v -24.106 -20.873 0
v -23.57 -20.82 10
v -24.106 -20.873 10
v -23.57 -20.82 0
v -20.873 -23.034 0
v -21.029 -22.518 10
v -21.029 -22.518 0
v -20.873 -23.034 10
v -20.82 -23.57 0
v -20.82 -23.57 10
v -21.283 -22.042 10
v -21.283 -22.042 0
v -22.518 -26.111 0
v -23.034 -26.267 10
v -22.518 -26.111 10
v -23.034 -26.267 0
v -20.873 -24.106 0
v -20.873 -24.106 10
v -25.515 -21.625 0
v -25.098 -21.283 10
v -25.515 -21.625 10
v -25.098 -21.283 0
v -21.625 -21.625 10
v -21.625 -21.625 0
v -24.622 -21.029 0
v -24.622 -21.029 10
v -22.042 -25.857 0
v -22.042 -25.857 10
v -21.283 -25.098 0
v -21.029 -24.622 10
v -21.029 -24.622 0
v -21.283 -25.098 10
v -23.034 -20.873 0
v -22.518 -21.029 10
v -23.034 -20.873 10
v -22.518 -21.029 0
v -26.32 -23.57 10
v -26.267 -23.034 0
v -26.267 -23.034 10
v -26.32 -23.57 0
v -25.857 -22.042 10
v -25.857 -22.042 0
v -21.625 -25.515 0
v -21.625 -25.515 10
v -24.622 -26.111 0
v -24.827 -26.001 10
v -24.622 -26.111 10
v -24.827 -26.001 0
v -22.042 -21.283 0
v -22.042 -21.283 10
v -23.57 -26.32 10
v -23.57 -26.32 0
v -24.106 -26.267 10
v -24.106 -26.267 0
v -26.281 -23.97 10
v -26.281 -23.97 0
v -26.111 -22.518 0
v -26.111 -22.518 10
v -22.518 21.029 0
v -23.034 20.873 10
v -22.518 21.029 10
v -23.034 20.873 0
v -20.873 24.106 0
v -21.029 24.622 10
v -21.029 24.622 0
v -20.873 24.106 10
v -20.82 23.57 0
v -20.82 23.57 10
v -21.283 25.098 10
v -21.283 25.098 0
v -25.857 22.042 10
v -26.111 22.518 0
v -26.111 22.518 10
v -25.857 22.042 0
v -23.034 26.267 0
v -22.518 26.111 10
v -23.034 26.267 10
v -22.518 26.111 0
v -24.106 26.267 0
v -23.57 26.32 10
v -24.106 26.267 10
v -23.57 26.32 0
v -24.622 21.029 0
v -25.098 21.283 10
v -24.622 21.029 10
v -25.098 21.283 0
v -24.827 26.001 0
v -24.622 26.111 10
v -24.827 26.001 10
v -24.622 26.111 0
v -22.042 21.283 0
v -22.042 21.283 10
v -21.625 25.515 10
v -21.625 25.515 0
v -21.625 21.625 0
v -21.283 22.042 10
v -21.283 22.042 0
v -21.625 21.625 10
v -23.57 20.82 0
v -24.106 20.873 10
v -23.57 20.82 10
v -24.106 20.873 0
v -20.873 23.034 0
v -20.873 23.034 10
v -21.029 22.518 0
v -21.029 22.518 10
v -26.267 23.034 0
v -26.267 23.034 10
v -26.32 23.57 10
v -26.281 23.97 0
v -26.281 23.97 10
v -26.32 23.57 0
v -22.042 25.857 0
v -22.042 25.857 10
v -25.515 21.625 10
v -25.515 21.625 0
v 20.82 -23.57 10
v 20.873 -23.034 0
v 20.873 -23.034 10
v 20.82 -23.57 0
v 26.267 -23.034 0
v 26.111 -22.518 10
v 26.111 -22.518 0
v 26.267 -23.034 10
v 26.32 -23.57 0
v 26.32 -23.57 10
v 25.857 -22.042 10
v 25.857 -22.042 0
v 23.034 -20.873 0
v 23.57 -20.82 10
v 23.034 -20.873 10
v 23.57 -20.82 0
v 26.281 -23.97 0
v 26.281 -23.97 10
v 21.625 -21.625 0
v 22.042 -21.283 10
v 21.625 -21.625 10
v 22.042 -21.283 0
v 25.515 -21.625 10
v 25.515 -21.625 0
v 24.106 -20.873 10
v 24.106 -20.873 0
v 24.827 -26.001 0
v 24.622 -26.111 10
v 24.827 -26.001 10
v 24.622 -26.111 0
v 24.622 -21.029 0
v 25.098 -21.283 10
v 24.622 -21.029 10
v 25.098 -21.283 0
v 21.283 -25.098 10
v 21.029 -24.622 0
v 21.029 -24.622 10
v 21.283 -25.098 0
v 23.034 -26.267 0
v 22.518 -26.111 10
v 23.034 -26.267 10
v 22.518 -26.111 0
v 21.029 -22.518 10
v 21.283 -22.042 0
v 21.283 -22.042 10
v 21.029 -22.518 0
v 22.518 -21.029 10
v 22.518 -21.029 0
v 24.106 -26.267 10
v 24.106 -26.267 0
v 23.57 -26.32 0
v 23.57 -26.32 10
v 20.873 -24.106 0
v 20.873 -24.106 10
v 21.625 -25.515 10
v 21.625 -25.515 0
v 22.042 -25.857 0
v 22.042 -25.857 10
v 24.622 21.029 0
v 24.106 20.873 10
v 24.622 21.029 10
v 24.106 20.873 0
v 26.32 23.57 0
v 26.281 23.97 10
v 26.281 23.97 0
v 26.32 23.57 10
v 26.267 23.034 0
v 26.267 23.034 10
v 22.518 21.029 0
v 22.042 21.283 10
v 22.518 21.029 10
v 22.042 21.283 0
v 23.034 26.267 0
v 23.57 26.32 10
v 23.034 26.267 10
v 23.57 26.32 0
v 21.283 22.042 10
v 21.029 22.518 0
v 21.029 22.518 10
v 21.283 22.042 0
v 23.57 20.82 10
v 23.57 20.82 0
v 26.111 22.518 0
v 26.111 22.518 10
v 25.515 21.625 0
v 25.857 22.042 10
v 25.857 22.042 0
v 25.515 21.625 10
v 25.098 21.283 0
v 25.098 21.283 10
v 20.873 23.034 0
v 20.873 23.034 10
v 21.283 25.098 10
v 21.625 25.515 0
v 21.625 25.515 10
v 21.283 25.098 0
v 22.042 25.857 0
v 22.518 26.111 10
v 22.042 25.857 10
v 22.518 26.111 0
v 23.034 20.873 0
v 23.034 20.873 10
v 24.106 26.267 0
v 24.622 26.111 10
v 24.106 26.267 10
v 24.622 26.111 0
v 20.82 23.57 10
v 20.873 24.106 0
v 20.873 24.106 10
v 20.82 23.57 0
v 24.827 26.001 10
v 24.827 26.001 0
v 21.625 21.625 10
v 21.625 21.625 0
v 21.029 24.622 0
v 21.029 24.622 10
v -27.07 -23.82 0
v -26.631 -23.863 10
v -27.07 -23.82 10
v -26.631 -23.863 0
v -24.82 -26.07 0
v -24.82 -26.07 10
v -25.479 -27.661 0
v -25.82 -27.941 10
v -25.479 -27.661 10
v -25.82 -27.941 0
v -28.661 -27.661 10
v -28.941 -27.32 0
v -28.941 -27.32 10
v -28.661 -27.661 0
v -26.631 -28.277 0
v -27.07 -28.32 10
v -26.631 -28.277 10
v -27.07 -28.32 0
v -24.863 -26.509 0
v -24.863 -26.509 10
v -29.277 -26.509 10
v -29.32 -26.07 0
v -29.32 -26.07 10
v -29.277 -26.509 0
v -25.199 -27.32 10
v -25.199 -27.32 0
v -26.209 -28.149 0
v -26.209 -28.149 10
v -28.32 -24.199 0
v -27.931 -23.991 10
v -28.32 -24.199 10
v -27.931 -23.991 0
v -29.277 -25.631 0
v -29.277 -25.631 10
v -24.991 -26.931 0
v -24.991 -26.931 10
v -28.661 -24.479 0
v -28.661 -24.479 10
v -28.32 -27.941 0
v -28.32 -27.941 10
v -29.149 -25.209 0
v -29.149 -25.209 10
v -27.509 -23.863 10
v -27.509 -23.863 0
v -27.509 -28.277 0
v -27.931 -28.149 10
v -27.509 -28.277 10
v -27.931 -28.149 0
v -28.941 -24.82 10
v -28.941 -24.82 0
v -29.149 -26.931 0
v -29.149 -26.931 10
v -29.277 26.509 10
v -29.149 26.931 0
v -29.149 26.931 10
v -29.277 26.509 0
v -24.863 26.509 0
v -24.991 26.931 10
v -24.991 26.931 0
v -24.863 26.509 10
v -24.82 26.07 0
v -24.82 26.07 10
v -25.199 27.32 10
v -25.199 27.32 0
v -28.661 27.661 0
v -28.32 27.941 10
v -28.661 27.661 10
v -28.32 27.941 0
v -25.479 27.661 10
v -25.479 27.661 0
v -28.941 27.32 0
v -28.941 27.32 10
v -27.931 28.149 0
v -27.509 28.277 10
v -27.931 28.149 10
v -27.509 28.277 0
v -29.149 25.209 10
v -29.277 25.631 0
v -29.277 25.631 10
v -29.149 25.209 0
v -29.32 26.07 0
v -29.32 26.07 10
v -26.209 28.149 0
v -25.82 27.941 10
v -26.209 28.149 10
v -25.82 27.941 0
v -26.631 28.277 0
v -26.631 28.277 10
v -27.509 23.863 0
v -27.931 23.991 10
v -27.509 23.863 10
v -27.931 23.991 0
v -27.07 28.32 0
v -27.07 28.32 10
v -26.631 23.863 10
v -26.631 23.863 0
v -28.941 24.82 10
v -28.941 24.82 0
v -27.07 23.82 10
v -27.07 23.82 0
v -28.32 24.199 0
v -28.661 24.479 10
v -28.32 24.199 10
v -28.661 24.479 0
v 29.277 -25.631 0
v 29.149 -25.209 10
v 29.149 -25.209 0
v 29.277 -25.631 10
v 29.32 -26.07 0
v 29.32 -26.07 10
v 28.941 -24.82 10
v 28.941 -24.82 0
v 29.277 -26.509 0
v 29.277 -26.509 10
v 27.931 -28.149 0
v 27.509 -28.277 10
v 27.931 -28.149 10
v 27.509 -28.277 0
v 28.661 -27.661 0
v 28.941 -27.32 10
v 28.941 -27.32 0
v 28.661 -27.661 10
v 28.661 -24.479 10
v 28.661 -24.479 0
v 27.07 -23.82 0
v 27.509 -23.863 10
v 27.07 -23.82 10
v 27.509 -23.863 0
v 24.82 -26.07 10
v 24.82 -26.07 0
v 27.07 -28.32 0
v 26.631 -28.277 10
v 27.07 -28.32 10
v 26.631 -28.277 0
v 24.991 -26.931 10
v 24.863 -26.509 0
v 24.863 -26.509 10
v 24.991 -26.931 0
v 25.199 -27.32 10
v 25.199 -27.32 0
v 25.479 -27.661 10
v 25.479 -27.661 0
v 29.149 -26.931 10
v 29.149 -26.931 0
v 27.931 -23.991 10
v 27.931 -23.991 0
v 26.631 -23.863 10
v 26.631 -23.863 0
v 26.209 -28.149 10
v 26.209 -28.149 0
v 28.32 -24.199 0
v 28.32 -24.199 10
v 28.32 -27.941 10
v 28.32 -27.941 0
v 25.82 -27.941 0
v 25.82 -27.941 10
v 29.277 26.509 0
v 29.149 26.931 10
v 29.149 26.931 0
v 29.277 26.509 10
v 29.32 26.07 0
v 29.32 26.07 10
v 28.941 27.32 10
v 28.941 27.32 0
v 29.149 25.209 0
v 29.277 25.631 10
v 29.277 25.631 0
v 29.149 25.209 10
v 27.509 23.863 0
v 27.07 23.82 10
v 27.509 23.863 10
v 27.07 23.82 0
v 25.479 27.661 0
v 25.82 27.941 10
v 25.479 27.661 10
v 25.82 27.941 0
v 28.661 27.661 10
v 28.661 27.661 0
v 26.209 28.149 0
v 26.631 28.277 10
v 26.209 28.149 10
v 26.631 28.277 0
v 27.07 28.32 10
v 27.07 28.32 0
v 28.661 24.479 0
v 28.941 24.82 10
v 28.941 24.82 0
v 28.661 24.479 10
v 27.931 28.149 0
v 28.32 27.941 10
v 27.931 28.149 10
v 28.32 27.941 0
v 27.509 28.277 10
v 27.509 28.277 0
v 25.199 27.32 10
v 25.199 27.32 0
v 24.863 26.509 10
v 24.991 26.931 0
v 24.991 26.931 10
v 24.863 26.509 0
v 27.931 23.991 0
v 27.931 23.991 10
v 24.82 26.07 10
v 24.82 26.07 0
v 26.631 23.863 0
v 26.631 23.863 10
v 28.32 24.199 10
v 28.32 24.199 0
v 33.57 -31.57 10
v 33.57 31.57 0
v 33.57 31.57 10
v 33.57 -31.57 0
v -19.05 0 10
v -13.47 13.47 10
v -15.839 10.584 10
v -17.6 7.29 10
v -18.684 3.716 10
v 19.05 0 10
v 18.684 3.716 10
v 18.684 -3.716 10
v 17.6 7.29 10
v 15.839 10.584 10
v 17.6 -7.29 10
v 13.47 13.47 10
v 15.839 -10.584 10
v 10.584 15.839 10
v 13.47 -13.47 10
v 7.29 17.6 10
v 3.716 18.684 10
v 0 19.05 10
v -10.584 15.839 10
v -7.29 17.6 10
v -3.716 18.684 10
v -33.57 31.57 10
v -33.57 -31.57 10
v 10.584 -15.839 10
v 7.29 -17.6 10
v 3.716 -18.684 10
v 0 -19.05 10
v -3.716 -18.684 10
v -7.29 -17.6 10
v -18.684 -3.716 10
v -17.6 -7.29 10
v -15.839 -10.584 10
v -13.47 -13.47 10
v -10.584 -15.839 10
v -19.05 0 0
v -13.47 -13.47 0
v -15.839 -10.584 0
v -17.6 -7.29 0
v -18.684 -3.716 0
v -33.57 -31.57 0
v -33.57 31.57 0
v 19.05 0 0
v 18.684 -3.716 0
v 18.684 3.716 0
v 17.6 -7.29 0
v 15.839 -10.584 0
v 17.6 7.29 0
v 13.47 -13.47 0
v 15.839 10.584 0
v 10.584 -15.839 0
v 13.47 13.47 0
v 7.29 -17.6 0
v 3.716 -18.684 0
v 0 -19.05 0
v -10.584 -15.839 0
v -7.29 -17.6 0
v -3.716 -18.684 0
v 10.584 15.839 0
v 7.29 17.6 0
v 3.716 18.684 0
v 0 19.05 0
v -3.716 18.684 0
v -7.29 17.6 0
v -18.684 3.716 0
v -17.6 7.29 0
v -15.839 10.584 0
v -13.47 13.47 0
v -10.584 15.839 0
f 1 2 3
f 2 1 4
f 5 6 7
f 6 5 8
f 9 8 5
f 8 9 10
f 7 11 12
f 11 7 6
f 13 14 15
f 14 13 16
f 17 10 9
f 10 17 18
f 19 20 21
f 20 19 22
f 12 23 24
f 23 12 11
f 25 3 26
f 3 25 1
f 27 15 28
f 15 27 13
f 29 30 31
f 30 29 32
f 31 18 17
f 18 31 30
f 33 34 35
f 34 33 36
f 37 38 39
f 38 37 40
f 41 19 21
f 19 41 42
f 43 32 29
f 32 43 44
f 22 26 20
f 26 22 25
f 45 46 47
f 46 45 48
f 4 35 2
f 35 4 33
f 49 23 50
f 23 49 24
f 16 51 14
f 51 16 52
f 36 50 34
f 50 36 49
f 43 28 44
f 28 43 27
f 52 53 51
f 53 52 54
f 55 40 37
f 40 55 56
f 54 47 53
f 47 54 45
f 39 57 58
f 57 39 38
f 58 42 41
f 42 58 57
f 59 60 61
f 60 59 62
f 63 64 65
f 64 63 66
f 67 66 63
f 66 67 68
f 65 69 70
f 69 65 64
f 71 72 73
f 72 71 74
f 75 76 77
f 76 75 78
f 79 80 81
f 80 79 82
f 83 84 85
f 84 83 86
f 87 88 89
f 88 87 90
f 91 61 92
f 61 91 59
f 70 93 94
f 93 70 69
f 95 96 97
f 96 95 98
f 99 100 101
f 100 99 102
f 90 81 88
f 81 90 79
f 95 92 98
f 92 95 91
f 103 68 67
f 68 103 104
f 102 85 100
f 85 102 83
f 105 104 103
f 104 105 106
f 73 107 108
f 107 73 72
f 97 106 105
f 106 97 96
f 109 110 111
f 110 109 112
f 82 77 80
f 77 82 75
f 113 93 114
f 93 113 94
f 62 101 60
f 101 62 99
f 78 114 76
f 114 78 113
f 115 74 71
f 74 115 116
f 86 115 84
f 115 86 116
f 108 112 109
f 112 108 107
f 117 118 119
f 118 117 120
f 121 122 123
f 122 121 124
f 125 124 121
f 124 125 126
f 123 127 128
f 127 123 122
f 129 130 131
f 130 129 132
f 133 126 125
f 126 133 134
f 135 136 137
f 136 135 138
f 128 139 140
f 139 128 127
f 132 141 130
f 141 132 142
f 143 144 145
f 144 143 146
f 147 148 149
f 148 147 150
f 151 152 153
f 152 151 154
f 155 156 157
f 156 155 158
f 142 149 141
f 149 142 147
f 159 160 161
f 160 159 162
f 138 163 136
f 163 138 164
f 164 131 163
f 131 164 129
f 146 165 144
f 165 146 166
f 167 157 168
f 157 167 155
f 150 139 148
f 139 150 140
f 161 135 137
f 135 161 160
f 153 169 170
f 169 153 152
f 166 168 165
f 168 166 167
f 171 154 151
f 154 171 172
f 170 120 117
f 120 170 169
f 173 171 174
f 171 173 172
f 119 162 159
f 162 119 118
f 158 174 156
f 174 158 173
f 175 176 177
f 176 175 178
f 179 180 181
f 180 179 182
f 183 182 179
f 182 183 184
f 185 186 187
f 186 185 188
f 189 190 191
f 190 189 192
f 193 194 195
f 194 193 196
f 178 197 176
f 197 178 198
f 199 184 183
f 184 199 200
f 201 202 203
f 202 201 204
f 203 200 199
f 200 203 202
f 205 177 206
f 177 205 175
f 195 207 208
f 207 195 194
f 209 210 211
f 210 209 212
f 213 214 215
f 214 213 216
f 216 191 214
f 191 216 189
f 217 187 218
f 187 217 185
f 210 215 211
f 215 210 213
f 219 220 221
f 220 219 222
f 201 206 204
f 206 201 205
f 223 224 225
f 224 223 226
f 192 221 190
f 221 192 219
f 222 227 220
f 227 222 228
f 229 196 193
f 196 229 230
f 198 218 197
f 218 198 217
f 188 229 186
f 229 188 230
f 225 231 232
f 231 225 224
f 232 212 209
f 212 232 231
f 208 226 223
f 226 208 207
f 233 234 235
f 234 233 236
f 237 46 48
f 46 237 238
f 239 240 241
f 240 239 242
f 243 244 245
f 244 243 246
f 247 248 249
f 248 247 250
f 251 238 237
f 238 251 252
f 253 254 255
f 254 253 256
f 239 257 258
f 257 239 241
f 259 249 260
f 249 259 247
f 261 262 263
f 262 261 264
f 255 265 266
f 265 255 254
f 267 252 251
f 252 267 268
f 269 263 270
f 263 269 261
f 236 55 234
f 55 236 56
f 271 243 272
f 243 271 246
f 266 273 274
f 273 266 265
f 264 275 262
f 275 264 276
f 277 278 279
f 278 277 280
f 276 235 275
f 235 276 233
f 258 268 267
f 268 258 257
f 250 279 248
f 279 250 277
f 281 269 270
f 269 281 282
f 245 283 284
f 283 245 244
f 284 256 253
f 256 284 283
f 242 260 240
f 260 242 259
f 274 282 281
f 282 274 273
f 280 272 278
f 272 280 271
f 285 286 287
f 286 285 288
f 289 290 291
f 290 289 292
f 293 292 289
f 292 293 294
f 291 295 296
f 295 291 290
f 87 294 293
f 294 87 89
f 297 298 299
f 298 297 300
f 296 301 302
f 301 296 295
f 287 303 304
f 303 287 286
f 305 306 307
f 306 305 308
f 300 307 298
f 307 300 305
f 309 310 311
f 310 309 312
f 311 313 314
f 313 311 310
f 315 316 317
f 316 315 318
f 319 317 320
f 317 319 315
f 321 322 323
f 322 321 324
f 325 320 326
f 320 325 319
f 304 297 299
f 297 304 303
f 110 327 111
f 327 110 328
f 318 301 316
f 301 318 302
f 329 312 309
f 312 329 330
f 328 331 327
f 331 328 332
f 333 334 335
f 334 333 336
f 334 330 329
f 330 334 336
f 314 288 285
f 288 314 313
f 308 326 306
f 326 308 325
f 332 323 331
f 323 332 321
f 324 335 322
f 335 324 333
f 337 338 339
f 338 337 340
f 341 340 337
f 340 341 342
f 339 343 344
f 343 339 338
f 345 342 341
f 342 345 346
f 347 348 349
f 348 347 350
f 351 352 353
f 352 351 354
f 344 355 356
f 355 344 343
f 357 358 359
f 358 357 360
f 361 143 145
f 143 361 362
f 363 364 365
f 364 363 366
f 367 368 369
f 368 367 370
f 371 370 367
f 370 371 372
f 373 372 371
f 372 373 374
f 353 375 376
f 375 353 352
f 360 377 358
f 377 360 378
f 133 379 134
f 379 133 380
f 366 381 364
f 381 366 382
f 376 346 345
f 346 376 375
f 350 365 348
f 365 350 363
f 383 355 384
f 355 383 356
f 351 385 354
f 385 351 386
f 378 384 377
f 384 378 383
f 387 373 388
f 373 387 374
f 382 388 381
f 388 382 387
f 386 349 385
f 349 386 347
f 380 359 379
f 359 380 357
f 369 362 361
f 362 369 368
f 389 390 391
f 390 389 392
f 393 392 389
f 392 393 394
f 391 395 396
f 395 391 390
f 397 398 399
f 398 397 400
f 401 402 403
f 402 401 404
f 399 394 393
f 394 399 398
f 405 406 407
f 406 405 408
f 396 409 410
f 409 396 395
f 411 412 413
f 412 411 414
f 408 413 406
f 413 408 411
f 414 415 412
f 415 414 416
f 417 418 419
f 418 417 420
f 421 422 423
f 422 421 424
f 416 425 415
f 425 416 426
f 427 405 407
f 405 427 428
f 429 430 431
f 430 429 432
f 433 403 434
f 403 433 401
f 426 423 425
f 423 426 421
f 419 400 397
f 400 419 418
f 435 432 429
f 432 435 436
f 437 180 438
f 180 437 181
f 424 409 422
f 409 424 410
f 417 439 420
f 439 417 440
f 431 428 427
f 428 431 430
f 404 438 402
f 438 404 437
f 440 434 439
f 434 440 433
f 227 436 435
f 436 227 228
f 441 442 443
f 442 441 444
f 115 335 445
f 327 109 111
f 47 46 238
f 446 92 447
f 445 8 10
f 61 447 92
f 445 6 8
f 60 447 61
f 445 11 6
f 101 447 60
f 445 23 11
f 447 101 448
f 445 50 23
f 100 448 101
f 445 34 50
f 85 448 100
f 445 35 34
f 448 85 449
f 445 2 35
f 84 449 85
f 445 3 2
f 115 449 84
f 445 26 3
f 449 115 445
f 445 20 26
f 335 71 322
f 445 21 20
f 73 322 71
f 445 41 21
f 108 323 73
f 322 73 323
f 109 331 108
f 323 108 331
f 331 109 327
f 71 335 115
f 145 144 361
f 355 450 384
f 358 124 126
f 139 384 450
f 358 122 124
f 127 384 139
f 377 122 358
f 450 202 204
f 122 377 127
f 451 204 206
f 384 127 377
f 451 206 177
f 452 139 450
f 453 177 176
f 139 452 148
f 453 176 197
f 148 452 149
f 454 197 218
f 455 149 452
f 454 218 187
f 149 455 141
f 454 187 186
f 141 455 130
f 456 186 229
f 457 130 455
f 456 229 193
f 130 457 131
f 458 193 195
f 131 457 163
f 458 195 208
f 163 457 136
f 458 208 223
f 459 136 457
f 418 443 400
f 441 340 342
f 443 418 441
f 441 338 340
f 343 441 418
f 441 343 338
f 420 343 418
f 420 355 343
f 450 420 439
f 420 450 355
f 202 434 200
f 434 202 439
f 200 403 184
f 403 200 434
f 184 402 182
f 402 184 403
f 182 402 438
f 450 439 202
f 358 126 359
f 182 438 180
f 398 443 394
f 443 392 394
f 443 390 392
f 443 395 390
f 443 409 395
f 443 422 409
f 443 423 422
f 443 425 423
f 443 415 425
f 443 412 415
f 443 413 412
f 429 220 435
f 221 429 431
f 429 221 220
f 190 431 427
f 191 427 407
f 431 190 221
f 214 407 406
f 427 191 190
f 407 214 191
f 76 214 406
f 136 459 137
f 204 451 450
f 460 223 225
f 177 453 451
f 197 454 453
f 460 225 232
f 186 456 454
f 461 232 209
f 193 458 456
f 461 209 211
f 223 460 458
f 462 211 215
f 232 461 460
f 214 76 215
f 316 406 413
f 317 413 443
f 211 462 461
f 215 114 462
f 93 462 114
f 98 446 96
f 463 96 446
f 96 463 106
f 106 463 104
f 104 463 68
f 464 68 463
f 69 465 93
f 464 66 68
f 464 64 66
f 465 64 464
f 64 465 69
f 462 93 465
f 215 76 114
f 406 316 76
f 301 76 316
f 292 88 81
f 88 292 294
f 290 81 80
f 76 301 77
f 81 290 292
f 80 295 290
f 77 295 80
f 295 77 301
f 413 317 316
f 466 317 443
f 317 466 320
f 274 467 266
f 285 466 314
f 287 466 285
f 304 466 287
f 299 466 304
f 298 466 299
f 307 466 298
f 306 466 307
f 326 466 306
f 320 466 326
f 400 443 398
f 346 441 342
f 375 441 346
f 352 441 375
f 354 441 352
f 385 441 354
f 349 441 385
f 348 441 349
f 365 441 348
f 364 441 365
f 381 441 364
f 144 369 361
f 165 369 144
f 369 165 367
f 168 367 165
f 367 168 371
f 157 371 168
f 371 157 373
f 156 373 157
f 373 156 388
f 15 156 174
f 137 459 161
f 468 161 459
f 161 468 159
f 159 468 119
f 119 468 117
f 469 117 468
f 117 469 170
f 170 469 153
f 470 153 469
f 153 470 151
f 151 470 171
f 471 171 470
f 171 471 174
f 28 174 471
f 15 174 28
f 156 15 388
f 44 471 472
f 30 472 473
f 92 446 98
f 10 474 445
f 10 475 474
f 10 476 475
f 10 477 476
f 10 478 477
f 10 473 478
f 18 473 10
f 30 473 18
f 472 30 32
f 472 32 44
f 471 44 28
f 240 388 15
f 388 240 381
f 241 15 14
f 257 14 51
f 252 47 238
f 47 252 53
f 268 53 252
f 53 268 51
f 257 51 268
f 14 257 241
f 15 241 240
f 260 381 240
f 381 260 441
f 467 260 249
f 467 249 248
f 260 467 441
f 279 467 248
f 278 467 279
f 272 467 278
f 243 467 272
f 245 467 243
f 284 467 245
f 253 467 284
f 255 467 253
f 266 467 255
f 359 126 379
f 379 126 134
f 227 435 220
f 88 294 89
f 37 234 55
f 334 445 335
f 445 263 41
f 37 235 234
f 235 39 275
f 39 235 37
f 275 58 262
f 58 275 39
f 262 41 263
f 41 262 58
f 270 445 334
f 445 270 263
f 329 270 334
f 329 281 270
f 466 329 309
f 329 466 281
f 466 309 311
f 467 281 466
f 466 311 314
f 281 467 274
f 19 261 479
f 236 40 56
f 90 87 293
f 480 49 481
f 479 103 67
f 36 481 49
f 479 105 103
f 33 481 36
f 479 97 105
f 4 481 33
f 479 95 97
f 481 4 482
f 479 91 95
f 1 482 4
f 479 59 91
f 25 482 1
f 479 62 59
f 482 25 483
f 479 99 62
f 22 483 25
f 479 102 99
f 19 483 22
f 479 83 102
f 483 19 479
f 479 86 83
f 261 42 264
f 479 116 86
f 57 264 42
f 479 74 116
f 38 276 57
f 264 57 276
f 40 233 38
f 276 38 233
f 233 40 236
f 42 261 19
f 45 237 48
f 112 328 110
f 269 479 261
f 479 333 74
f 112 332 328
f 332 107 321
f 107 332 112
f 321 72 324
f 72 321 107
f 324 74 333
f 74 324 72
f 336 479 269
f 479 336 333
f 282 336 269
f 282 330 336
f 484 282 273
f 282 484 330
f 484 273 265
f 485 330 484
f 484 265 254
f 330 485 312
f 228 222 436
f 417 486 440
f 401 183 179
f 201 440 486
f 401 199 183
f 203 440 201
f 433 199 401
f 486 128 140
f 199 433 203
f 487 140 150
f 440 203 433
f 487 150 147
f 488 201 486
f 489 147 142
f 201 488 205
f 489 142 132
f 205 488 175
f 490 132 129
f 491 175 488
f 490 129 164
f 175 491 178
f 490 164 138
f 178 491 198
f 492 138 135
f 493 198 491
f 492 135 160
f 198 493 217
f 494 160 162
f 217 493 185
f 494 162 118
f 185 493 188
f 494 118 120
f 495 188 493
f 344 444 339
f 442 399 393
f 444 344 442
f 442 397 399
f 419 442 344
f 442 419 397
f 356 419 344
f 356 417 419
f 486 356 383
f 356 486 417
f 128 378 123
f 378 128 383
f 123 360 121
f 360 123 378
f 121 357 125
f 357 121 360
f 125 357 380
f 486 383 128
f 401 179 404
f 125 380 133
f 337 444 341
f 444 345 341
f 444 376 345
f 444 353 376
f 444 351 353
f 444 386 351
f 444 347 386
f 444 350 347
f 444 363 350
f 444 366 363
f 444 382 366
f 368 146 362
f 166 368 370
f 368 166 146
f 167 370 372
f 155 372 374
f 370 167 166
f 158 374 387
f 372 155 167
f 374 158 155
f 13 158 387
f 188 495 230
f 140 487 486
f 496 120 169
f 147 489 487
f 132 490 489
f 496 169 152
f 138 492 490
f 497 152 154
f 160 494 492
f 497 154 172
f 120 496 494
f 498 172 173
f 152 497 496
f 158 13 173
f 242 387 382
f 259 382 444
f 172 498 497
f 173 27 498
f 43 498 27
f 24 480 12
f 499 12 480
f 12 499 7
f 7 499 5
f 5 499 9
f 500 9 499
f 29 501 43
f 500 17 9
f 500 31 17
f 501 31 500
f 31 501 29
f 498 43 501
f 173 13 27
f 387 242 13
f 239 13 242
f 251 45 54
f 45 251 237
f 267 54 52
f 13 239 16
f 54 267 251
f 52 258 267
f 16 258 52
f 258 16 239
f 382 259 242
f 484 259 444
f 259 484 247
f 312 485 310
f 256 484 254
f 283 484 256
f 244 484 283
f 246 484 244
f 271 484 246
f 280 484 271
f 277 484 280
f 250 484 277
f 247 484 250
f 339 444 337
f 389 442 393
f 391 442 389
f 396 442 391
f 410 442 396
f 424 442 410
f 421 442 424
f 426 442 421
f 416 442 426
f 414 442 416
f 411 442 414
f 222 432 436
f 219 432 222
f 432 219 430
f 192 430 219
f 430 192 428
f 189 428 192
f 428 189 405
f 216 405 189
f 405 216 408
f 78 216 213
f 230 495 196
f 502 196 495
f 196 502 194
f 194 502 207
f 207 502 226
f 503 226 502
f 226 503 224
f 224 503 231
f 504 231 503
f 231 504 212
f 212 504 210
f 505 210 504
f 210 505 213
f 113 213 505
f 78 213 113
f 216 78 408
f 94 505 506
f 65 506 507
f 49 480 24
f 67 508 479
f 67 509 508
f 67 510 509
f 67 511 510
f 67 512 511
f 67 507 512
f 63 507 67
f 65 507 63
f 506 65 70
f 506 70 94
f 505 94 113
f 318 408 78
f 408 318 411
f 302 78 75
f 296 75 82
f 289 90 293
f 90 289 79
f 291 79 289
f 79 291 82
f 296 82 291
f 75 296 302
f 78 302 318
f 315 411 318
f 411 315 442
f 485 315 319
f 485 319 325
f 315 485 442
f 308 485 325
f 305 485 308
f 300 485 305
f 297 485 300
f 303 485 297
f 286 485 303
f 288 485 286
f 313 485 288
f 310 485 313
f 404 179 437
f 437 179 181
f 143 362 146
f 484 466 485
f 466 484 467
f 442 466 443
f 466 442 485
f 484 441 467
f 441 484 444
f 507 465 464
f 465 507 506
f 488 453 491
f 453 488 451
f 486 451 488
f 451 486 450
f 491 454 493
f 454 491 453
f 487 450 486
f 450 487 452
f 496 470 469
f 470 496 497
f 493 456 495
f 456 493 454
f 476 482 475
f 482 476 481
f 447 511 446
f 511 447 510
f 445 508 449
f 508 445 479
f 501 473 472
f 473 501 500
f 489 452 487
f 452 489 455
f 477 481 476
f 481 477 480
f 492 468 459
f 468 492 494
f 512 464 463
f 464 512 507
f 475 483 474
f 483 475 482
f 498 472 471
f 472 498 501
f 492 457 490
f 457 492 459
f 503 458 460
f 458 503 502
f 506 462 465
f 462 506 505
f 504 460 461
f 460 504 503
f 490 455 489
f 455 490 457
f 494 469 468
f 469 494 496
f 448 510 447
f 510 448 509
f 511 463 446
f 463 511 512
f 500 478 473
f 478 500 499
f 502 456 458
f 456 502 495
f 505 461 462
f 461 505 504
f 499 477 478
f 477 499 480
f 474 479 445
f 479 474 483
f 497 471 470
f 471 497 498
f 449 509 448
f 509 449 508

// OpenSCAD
$fn = 32;

// ----------------------------------------------------------------------
// Motor mount plate: NEMA23, 67.14 x 63.14 x 10 mm
// ----------------------------------------------------------------------

// --- parameters (mm) ---
mount_w = 67.14;          // plate length, X
mount_d = 63.14;          // plate width, Y
mat_t = 10;               // plate thickness
motor_pitch = 47.14;      // NEMA23 bolt spacing
motor_d = 5.5;            // NEMA23 screw clearance
center_bore = 38.1;       // pilot boss bore
second_d = 4.5;           // second fastener hole

module plate() {
  translate([-mount_w / 2, -mount_d / 2, 0]) cube([mount_w, mount_d, mat_t]);
}

module motor_holes() {
  for (sx = [-1, 1]) for (sy = [-1, 1])
    translate([sx * motor_pitch / 2, sy * motor_pitch / 2, -1])
      cylinder(h = mat_t + 2, d = motor_d);
}

difference() {
  union() {
    plate();
  }
  motor_holes();
  translate([0, 0, -1]) cylinder(h = mat_t + 2, d = center_bore);
  for (sx = [-1, 1]) for (sy = [-1, 1])
    translate([sx * 27.07, sy * 26.07, -1]) cylinder(h = mat_t + 2, d = second_d);
}
